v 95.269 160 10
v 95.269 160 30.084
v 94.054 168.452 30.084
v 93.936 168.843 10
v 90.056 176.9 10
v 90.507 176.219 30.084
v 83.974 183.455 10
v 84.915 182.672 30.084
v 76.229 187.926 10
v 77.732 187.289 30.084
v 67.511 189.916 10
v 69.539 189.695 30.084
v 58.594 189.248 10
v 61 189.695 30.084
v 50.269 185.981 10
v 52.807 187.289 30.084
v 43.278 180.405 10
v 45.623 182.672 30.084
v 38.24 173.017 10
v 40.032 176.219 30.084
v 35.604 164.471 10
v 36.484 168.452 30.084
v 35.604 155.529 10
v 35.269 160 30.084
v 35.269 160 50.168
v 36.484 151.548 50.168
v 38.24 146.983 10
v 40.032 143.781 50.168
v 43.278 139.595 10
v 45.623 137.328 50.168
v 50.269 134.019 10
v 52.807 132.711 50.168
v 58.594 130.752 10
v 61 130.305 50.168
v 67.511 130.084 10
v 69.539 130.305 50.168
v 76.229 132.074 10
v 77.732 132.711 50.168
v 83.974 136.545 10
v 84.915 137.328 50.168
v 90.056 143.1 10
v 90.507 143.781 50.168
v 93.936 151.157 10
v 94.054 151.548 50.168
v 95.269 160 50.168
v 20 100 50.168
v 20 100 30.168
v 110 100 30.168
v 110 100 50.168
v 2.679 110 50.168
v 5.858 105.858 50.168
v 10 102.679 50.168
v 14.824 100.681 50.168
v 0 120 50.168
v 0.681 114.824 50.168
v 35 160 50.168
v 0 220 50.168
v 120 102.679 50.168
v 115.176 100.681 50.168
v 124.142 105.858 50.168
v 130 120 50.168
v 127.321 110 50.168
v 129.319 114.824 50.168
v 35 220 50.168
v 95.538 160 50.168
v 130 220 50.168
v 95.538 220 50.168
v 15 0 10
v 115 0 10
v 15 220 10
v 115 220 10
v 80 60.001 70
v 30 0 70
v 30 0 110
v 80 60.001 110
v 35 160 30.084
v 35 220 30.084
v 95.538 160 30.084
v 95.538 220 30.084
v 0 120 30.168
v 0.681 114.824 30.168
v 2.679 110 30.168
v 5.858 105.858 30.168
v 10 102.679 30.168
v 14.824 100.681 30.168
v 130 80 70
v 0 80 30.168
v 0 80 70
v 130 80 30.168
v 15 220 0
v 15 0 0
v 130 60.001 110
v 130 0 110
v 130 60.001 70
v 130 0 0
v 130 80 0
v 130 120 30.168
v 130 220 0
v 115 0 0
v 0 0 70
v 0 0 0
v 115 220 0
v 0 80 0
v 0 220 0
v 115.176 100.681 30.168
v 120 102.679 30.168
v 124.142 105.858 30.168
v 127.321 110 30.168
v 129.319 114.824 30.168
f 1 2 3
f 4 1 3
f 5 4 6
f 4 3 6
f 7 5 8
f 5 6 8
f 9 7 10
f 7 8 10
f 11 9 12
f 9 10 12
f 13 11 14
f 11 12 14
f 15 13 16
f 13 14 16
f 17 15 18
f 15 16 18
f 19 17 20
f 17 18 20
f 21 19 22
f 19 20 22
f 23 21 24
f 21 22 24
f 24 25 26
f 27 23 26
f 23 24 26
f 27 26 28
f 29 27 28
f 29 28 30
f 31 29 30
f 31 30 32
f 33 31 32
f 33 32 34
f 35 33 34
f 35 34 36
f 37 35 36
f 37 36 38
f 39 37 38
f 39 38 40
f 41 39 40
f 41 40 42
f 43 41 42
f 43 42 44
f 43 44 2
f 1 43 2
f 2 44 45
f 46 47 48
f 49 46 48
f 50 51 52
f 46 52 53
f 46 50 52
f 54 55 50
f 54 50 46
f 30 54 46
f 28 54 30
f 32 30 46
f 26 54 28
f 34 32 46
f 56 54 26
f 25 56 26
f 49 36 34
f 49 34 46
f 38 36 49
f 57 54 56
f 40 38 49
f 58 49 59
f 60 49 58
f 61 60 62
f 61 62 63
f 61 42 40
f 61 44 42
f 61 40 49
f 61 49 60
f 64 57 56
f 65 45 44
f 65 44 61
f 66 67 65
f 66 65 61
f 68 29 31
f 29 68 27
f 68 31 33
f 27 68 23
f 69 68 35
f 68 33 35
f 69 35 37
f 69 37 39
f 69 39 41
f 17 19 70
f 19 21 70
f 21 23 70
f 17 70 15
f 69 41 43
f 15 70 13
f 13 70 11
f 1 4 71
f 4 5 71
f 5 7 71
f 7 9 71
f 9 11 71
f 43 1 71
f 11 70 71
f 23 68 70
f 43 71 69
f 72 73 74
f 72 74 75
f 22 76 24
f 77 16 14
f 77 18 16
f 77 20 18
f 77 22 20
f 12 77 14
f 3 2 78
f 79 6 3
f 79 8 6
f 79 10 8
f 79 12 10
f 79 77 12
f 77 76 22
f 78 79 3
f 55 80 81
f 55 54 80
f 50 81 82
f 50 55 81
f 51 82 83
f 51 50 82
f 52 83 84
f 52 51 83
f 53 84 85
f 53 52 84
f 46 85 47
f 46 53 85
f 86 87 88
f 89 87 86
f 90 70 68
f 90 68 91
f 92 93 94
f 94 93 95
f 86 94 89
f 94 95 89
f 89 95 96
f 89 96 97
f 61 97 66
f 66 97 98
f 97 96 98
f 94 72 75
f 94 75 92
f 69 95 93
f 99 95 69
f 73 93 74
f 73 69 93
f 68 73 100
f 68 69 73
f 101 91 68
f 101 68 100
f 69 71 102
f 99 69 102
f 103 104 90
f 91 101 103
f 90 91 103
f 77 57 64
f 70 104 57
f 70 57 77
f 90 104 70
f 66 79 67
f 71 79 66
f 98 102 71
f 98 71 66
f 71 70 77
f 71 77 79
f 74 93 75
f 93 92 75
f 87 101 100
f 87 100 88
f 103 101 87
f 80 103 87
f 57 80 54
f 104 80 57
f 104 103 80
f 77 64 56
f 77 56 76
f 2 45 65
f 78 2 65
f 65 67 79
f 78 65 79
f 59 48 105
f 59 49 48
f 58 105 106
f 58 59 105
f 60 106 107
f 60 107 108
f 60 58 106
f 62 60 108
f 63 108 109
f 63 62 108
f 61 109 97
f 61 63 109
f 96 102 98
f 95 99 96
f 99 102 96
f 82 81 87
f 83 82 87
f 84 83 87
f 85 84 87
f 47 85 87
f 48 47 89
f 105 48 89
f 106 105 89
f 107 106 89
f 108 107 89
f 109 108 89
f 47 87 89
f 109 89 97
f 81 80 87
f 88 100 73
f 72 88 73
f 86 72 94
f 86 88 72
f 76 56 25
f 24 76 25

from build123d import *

# Parameters (mm, degrees)
ESBO_O1_W                = 130
ESBO_O1_H                = 80
RESSALTO_EXTRUS_O1_DEPTH = 70
RESSALTO_EXTRUS_O2_DEPTH = 40
ESBO_O3_W                = 130
ESBO_O3_H                = 30.168266629
RESSALTO_EXTRUS_O3_DEPTH = 140
ESBO_O4_W                = 130
ESBO_O4_H                = 120
RESSALTO_EXTRUS_O4_DEPTH = 20
ESBO_O5_W                = 100
ESBO_O5_H                = 10
CORTE_EXTRUS_O1_DEPTH    = 260
FILETE3_R                = 20
FILETE4_R                = 20
ESBO_O12_W               = 60.538405015
ESBO_O12_H               = 20.084133314
CORTE_EXTRUS_O3_DEPTH    = 60
ESBO_O13_R               = 30
CORTE_EXTRUS_O4_DEPTH    = 60


with BuildPart() as part:
    # Esboço1 → Ressalto-extrusão1 (new body)
    with BuildSketch(Plane.XY):
        with Locations((65, 40)):
            Rectangle(ESBO_O1_W, ESBO_O1_H)
    extrude(amount=RESSALTO_EXTRUS_O1_DEPTH)

    # Esboço2 → Ressalto-extrusão2 (add)
    with BuildSketch(Plane.XY.offset(70)):
        Polygon((130, 0), (30, 0), (80, 60.000756035), (130, 60.000756035), align=None)
    extrude(amount=RESSALTO_EXTRUS_O2_DEPTH)

    # Esboço3 → Ressalto-extrusão3 (add)
    with BuildSketch(Plane(origin=(0, 80, 0), x_dir=(1, 0, 0), z_dir=(0, 1, 0))):
        with Locations((65, -15.084133315)):
            Rectangle(ESBO_O3_W, ESBO_O3_H)
    extrude(amount=RESSALTO_EXTRUS_O3_DEPTH)

    # Esboço4 → Ressalto-extrusão4 (add)
    with BuildSketch(Plane.XY.offset(30.168266629)):
        with Locations((65, 160)):
            Rectangle(ESBO_O4_W, ESBO_O4_H)
    extrude(amount=RESSALTO_EXTRUS_O4_DEPTH)

    # Esboço5 → Corte-extrusão1 (cut)
    with BuildSketch(Plane(origin=(0, 220, 0), x_dir=(1, 0, 0), z_dir=(0, 1, 0))):
        with Locations((65, -5)):
            Rectangle(ESBO_O5_W, ESBO_O5_H)
    extrude(amount=-CORTE_EXTRUS_O1_DEPTH, mode=Mode.SUBTRACT)

    # Filete3
    filete3_edges = [part.edges().sort_by_distance(p)[0] for p in [
        (0, 100, 40.168266629),
    ]]
    fillet(filete3_edges, radius=FILETE3_R)

    # Filete4
    filete4_edges = [part.edges().sort_by_distance(p)[0] for p in [
        (130, 100, 40.168266629),
    ]]
    fillet(filete4_edges, radius=FILETE4_R)

    # Esboço12 → Corte-extrusão3 (cut)
    with BuildSketch(Plane(origin=(0, 220, 0), x_dir=(1, 0, 0), z_dir=(0, 1, 0))):
        with Locations((65.269202508, -40.126199972)):
            Rectangle(ESBO_O12_W, ESBO_O12_H)
    extrude(amount=-CORTE_EXTRUS_O3_DEPTH, mode=Mode.SUBTRACT)

    # Esboço13 → Corte-extrusão4 (cut)
    with BuildSketch(Plane.XY.offset(50.168266629)):
        with Locations((65.269202508, 160)):
            Circle(ESBO_O13_R)
    extrude(amount=-CORTE_EXTRUS_O4_DEPTH, mode=Mode.SUBTRACT)


solid = part.part
